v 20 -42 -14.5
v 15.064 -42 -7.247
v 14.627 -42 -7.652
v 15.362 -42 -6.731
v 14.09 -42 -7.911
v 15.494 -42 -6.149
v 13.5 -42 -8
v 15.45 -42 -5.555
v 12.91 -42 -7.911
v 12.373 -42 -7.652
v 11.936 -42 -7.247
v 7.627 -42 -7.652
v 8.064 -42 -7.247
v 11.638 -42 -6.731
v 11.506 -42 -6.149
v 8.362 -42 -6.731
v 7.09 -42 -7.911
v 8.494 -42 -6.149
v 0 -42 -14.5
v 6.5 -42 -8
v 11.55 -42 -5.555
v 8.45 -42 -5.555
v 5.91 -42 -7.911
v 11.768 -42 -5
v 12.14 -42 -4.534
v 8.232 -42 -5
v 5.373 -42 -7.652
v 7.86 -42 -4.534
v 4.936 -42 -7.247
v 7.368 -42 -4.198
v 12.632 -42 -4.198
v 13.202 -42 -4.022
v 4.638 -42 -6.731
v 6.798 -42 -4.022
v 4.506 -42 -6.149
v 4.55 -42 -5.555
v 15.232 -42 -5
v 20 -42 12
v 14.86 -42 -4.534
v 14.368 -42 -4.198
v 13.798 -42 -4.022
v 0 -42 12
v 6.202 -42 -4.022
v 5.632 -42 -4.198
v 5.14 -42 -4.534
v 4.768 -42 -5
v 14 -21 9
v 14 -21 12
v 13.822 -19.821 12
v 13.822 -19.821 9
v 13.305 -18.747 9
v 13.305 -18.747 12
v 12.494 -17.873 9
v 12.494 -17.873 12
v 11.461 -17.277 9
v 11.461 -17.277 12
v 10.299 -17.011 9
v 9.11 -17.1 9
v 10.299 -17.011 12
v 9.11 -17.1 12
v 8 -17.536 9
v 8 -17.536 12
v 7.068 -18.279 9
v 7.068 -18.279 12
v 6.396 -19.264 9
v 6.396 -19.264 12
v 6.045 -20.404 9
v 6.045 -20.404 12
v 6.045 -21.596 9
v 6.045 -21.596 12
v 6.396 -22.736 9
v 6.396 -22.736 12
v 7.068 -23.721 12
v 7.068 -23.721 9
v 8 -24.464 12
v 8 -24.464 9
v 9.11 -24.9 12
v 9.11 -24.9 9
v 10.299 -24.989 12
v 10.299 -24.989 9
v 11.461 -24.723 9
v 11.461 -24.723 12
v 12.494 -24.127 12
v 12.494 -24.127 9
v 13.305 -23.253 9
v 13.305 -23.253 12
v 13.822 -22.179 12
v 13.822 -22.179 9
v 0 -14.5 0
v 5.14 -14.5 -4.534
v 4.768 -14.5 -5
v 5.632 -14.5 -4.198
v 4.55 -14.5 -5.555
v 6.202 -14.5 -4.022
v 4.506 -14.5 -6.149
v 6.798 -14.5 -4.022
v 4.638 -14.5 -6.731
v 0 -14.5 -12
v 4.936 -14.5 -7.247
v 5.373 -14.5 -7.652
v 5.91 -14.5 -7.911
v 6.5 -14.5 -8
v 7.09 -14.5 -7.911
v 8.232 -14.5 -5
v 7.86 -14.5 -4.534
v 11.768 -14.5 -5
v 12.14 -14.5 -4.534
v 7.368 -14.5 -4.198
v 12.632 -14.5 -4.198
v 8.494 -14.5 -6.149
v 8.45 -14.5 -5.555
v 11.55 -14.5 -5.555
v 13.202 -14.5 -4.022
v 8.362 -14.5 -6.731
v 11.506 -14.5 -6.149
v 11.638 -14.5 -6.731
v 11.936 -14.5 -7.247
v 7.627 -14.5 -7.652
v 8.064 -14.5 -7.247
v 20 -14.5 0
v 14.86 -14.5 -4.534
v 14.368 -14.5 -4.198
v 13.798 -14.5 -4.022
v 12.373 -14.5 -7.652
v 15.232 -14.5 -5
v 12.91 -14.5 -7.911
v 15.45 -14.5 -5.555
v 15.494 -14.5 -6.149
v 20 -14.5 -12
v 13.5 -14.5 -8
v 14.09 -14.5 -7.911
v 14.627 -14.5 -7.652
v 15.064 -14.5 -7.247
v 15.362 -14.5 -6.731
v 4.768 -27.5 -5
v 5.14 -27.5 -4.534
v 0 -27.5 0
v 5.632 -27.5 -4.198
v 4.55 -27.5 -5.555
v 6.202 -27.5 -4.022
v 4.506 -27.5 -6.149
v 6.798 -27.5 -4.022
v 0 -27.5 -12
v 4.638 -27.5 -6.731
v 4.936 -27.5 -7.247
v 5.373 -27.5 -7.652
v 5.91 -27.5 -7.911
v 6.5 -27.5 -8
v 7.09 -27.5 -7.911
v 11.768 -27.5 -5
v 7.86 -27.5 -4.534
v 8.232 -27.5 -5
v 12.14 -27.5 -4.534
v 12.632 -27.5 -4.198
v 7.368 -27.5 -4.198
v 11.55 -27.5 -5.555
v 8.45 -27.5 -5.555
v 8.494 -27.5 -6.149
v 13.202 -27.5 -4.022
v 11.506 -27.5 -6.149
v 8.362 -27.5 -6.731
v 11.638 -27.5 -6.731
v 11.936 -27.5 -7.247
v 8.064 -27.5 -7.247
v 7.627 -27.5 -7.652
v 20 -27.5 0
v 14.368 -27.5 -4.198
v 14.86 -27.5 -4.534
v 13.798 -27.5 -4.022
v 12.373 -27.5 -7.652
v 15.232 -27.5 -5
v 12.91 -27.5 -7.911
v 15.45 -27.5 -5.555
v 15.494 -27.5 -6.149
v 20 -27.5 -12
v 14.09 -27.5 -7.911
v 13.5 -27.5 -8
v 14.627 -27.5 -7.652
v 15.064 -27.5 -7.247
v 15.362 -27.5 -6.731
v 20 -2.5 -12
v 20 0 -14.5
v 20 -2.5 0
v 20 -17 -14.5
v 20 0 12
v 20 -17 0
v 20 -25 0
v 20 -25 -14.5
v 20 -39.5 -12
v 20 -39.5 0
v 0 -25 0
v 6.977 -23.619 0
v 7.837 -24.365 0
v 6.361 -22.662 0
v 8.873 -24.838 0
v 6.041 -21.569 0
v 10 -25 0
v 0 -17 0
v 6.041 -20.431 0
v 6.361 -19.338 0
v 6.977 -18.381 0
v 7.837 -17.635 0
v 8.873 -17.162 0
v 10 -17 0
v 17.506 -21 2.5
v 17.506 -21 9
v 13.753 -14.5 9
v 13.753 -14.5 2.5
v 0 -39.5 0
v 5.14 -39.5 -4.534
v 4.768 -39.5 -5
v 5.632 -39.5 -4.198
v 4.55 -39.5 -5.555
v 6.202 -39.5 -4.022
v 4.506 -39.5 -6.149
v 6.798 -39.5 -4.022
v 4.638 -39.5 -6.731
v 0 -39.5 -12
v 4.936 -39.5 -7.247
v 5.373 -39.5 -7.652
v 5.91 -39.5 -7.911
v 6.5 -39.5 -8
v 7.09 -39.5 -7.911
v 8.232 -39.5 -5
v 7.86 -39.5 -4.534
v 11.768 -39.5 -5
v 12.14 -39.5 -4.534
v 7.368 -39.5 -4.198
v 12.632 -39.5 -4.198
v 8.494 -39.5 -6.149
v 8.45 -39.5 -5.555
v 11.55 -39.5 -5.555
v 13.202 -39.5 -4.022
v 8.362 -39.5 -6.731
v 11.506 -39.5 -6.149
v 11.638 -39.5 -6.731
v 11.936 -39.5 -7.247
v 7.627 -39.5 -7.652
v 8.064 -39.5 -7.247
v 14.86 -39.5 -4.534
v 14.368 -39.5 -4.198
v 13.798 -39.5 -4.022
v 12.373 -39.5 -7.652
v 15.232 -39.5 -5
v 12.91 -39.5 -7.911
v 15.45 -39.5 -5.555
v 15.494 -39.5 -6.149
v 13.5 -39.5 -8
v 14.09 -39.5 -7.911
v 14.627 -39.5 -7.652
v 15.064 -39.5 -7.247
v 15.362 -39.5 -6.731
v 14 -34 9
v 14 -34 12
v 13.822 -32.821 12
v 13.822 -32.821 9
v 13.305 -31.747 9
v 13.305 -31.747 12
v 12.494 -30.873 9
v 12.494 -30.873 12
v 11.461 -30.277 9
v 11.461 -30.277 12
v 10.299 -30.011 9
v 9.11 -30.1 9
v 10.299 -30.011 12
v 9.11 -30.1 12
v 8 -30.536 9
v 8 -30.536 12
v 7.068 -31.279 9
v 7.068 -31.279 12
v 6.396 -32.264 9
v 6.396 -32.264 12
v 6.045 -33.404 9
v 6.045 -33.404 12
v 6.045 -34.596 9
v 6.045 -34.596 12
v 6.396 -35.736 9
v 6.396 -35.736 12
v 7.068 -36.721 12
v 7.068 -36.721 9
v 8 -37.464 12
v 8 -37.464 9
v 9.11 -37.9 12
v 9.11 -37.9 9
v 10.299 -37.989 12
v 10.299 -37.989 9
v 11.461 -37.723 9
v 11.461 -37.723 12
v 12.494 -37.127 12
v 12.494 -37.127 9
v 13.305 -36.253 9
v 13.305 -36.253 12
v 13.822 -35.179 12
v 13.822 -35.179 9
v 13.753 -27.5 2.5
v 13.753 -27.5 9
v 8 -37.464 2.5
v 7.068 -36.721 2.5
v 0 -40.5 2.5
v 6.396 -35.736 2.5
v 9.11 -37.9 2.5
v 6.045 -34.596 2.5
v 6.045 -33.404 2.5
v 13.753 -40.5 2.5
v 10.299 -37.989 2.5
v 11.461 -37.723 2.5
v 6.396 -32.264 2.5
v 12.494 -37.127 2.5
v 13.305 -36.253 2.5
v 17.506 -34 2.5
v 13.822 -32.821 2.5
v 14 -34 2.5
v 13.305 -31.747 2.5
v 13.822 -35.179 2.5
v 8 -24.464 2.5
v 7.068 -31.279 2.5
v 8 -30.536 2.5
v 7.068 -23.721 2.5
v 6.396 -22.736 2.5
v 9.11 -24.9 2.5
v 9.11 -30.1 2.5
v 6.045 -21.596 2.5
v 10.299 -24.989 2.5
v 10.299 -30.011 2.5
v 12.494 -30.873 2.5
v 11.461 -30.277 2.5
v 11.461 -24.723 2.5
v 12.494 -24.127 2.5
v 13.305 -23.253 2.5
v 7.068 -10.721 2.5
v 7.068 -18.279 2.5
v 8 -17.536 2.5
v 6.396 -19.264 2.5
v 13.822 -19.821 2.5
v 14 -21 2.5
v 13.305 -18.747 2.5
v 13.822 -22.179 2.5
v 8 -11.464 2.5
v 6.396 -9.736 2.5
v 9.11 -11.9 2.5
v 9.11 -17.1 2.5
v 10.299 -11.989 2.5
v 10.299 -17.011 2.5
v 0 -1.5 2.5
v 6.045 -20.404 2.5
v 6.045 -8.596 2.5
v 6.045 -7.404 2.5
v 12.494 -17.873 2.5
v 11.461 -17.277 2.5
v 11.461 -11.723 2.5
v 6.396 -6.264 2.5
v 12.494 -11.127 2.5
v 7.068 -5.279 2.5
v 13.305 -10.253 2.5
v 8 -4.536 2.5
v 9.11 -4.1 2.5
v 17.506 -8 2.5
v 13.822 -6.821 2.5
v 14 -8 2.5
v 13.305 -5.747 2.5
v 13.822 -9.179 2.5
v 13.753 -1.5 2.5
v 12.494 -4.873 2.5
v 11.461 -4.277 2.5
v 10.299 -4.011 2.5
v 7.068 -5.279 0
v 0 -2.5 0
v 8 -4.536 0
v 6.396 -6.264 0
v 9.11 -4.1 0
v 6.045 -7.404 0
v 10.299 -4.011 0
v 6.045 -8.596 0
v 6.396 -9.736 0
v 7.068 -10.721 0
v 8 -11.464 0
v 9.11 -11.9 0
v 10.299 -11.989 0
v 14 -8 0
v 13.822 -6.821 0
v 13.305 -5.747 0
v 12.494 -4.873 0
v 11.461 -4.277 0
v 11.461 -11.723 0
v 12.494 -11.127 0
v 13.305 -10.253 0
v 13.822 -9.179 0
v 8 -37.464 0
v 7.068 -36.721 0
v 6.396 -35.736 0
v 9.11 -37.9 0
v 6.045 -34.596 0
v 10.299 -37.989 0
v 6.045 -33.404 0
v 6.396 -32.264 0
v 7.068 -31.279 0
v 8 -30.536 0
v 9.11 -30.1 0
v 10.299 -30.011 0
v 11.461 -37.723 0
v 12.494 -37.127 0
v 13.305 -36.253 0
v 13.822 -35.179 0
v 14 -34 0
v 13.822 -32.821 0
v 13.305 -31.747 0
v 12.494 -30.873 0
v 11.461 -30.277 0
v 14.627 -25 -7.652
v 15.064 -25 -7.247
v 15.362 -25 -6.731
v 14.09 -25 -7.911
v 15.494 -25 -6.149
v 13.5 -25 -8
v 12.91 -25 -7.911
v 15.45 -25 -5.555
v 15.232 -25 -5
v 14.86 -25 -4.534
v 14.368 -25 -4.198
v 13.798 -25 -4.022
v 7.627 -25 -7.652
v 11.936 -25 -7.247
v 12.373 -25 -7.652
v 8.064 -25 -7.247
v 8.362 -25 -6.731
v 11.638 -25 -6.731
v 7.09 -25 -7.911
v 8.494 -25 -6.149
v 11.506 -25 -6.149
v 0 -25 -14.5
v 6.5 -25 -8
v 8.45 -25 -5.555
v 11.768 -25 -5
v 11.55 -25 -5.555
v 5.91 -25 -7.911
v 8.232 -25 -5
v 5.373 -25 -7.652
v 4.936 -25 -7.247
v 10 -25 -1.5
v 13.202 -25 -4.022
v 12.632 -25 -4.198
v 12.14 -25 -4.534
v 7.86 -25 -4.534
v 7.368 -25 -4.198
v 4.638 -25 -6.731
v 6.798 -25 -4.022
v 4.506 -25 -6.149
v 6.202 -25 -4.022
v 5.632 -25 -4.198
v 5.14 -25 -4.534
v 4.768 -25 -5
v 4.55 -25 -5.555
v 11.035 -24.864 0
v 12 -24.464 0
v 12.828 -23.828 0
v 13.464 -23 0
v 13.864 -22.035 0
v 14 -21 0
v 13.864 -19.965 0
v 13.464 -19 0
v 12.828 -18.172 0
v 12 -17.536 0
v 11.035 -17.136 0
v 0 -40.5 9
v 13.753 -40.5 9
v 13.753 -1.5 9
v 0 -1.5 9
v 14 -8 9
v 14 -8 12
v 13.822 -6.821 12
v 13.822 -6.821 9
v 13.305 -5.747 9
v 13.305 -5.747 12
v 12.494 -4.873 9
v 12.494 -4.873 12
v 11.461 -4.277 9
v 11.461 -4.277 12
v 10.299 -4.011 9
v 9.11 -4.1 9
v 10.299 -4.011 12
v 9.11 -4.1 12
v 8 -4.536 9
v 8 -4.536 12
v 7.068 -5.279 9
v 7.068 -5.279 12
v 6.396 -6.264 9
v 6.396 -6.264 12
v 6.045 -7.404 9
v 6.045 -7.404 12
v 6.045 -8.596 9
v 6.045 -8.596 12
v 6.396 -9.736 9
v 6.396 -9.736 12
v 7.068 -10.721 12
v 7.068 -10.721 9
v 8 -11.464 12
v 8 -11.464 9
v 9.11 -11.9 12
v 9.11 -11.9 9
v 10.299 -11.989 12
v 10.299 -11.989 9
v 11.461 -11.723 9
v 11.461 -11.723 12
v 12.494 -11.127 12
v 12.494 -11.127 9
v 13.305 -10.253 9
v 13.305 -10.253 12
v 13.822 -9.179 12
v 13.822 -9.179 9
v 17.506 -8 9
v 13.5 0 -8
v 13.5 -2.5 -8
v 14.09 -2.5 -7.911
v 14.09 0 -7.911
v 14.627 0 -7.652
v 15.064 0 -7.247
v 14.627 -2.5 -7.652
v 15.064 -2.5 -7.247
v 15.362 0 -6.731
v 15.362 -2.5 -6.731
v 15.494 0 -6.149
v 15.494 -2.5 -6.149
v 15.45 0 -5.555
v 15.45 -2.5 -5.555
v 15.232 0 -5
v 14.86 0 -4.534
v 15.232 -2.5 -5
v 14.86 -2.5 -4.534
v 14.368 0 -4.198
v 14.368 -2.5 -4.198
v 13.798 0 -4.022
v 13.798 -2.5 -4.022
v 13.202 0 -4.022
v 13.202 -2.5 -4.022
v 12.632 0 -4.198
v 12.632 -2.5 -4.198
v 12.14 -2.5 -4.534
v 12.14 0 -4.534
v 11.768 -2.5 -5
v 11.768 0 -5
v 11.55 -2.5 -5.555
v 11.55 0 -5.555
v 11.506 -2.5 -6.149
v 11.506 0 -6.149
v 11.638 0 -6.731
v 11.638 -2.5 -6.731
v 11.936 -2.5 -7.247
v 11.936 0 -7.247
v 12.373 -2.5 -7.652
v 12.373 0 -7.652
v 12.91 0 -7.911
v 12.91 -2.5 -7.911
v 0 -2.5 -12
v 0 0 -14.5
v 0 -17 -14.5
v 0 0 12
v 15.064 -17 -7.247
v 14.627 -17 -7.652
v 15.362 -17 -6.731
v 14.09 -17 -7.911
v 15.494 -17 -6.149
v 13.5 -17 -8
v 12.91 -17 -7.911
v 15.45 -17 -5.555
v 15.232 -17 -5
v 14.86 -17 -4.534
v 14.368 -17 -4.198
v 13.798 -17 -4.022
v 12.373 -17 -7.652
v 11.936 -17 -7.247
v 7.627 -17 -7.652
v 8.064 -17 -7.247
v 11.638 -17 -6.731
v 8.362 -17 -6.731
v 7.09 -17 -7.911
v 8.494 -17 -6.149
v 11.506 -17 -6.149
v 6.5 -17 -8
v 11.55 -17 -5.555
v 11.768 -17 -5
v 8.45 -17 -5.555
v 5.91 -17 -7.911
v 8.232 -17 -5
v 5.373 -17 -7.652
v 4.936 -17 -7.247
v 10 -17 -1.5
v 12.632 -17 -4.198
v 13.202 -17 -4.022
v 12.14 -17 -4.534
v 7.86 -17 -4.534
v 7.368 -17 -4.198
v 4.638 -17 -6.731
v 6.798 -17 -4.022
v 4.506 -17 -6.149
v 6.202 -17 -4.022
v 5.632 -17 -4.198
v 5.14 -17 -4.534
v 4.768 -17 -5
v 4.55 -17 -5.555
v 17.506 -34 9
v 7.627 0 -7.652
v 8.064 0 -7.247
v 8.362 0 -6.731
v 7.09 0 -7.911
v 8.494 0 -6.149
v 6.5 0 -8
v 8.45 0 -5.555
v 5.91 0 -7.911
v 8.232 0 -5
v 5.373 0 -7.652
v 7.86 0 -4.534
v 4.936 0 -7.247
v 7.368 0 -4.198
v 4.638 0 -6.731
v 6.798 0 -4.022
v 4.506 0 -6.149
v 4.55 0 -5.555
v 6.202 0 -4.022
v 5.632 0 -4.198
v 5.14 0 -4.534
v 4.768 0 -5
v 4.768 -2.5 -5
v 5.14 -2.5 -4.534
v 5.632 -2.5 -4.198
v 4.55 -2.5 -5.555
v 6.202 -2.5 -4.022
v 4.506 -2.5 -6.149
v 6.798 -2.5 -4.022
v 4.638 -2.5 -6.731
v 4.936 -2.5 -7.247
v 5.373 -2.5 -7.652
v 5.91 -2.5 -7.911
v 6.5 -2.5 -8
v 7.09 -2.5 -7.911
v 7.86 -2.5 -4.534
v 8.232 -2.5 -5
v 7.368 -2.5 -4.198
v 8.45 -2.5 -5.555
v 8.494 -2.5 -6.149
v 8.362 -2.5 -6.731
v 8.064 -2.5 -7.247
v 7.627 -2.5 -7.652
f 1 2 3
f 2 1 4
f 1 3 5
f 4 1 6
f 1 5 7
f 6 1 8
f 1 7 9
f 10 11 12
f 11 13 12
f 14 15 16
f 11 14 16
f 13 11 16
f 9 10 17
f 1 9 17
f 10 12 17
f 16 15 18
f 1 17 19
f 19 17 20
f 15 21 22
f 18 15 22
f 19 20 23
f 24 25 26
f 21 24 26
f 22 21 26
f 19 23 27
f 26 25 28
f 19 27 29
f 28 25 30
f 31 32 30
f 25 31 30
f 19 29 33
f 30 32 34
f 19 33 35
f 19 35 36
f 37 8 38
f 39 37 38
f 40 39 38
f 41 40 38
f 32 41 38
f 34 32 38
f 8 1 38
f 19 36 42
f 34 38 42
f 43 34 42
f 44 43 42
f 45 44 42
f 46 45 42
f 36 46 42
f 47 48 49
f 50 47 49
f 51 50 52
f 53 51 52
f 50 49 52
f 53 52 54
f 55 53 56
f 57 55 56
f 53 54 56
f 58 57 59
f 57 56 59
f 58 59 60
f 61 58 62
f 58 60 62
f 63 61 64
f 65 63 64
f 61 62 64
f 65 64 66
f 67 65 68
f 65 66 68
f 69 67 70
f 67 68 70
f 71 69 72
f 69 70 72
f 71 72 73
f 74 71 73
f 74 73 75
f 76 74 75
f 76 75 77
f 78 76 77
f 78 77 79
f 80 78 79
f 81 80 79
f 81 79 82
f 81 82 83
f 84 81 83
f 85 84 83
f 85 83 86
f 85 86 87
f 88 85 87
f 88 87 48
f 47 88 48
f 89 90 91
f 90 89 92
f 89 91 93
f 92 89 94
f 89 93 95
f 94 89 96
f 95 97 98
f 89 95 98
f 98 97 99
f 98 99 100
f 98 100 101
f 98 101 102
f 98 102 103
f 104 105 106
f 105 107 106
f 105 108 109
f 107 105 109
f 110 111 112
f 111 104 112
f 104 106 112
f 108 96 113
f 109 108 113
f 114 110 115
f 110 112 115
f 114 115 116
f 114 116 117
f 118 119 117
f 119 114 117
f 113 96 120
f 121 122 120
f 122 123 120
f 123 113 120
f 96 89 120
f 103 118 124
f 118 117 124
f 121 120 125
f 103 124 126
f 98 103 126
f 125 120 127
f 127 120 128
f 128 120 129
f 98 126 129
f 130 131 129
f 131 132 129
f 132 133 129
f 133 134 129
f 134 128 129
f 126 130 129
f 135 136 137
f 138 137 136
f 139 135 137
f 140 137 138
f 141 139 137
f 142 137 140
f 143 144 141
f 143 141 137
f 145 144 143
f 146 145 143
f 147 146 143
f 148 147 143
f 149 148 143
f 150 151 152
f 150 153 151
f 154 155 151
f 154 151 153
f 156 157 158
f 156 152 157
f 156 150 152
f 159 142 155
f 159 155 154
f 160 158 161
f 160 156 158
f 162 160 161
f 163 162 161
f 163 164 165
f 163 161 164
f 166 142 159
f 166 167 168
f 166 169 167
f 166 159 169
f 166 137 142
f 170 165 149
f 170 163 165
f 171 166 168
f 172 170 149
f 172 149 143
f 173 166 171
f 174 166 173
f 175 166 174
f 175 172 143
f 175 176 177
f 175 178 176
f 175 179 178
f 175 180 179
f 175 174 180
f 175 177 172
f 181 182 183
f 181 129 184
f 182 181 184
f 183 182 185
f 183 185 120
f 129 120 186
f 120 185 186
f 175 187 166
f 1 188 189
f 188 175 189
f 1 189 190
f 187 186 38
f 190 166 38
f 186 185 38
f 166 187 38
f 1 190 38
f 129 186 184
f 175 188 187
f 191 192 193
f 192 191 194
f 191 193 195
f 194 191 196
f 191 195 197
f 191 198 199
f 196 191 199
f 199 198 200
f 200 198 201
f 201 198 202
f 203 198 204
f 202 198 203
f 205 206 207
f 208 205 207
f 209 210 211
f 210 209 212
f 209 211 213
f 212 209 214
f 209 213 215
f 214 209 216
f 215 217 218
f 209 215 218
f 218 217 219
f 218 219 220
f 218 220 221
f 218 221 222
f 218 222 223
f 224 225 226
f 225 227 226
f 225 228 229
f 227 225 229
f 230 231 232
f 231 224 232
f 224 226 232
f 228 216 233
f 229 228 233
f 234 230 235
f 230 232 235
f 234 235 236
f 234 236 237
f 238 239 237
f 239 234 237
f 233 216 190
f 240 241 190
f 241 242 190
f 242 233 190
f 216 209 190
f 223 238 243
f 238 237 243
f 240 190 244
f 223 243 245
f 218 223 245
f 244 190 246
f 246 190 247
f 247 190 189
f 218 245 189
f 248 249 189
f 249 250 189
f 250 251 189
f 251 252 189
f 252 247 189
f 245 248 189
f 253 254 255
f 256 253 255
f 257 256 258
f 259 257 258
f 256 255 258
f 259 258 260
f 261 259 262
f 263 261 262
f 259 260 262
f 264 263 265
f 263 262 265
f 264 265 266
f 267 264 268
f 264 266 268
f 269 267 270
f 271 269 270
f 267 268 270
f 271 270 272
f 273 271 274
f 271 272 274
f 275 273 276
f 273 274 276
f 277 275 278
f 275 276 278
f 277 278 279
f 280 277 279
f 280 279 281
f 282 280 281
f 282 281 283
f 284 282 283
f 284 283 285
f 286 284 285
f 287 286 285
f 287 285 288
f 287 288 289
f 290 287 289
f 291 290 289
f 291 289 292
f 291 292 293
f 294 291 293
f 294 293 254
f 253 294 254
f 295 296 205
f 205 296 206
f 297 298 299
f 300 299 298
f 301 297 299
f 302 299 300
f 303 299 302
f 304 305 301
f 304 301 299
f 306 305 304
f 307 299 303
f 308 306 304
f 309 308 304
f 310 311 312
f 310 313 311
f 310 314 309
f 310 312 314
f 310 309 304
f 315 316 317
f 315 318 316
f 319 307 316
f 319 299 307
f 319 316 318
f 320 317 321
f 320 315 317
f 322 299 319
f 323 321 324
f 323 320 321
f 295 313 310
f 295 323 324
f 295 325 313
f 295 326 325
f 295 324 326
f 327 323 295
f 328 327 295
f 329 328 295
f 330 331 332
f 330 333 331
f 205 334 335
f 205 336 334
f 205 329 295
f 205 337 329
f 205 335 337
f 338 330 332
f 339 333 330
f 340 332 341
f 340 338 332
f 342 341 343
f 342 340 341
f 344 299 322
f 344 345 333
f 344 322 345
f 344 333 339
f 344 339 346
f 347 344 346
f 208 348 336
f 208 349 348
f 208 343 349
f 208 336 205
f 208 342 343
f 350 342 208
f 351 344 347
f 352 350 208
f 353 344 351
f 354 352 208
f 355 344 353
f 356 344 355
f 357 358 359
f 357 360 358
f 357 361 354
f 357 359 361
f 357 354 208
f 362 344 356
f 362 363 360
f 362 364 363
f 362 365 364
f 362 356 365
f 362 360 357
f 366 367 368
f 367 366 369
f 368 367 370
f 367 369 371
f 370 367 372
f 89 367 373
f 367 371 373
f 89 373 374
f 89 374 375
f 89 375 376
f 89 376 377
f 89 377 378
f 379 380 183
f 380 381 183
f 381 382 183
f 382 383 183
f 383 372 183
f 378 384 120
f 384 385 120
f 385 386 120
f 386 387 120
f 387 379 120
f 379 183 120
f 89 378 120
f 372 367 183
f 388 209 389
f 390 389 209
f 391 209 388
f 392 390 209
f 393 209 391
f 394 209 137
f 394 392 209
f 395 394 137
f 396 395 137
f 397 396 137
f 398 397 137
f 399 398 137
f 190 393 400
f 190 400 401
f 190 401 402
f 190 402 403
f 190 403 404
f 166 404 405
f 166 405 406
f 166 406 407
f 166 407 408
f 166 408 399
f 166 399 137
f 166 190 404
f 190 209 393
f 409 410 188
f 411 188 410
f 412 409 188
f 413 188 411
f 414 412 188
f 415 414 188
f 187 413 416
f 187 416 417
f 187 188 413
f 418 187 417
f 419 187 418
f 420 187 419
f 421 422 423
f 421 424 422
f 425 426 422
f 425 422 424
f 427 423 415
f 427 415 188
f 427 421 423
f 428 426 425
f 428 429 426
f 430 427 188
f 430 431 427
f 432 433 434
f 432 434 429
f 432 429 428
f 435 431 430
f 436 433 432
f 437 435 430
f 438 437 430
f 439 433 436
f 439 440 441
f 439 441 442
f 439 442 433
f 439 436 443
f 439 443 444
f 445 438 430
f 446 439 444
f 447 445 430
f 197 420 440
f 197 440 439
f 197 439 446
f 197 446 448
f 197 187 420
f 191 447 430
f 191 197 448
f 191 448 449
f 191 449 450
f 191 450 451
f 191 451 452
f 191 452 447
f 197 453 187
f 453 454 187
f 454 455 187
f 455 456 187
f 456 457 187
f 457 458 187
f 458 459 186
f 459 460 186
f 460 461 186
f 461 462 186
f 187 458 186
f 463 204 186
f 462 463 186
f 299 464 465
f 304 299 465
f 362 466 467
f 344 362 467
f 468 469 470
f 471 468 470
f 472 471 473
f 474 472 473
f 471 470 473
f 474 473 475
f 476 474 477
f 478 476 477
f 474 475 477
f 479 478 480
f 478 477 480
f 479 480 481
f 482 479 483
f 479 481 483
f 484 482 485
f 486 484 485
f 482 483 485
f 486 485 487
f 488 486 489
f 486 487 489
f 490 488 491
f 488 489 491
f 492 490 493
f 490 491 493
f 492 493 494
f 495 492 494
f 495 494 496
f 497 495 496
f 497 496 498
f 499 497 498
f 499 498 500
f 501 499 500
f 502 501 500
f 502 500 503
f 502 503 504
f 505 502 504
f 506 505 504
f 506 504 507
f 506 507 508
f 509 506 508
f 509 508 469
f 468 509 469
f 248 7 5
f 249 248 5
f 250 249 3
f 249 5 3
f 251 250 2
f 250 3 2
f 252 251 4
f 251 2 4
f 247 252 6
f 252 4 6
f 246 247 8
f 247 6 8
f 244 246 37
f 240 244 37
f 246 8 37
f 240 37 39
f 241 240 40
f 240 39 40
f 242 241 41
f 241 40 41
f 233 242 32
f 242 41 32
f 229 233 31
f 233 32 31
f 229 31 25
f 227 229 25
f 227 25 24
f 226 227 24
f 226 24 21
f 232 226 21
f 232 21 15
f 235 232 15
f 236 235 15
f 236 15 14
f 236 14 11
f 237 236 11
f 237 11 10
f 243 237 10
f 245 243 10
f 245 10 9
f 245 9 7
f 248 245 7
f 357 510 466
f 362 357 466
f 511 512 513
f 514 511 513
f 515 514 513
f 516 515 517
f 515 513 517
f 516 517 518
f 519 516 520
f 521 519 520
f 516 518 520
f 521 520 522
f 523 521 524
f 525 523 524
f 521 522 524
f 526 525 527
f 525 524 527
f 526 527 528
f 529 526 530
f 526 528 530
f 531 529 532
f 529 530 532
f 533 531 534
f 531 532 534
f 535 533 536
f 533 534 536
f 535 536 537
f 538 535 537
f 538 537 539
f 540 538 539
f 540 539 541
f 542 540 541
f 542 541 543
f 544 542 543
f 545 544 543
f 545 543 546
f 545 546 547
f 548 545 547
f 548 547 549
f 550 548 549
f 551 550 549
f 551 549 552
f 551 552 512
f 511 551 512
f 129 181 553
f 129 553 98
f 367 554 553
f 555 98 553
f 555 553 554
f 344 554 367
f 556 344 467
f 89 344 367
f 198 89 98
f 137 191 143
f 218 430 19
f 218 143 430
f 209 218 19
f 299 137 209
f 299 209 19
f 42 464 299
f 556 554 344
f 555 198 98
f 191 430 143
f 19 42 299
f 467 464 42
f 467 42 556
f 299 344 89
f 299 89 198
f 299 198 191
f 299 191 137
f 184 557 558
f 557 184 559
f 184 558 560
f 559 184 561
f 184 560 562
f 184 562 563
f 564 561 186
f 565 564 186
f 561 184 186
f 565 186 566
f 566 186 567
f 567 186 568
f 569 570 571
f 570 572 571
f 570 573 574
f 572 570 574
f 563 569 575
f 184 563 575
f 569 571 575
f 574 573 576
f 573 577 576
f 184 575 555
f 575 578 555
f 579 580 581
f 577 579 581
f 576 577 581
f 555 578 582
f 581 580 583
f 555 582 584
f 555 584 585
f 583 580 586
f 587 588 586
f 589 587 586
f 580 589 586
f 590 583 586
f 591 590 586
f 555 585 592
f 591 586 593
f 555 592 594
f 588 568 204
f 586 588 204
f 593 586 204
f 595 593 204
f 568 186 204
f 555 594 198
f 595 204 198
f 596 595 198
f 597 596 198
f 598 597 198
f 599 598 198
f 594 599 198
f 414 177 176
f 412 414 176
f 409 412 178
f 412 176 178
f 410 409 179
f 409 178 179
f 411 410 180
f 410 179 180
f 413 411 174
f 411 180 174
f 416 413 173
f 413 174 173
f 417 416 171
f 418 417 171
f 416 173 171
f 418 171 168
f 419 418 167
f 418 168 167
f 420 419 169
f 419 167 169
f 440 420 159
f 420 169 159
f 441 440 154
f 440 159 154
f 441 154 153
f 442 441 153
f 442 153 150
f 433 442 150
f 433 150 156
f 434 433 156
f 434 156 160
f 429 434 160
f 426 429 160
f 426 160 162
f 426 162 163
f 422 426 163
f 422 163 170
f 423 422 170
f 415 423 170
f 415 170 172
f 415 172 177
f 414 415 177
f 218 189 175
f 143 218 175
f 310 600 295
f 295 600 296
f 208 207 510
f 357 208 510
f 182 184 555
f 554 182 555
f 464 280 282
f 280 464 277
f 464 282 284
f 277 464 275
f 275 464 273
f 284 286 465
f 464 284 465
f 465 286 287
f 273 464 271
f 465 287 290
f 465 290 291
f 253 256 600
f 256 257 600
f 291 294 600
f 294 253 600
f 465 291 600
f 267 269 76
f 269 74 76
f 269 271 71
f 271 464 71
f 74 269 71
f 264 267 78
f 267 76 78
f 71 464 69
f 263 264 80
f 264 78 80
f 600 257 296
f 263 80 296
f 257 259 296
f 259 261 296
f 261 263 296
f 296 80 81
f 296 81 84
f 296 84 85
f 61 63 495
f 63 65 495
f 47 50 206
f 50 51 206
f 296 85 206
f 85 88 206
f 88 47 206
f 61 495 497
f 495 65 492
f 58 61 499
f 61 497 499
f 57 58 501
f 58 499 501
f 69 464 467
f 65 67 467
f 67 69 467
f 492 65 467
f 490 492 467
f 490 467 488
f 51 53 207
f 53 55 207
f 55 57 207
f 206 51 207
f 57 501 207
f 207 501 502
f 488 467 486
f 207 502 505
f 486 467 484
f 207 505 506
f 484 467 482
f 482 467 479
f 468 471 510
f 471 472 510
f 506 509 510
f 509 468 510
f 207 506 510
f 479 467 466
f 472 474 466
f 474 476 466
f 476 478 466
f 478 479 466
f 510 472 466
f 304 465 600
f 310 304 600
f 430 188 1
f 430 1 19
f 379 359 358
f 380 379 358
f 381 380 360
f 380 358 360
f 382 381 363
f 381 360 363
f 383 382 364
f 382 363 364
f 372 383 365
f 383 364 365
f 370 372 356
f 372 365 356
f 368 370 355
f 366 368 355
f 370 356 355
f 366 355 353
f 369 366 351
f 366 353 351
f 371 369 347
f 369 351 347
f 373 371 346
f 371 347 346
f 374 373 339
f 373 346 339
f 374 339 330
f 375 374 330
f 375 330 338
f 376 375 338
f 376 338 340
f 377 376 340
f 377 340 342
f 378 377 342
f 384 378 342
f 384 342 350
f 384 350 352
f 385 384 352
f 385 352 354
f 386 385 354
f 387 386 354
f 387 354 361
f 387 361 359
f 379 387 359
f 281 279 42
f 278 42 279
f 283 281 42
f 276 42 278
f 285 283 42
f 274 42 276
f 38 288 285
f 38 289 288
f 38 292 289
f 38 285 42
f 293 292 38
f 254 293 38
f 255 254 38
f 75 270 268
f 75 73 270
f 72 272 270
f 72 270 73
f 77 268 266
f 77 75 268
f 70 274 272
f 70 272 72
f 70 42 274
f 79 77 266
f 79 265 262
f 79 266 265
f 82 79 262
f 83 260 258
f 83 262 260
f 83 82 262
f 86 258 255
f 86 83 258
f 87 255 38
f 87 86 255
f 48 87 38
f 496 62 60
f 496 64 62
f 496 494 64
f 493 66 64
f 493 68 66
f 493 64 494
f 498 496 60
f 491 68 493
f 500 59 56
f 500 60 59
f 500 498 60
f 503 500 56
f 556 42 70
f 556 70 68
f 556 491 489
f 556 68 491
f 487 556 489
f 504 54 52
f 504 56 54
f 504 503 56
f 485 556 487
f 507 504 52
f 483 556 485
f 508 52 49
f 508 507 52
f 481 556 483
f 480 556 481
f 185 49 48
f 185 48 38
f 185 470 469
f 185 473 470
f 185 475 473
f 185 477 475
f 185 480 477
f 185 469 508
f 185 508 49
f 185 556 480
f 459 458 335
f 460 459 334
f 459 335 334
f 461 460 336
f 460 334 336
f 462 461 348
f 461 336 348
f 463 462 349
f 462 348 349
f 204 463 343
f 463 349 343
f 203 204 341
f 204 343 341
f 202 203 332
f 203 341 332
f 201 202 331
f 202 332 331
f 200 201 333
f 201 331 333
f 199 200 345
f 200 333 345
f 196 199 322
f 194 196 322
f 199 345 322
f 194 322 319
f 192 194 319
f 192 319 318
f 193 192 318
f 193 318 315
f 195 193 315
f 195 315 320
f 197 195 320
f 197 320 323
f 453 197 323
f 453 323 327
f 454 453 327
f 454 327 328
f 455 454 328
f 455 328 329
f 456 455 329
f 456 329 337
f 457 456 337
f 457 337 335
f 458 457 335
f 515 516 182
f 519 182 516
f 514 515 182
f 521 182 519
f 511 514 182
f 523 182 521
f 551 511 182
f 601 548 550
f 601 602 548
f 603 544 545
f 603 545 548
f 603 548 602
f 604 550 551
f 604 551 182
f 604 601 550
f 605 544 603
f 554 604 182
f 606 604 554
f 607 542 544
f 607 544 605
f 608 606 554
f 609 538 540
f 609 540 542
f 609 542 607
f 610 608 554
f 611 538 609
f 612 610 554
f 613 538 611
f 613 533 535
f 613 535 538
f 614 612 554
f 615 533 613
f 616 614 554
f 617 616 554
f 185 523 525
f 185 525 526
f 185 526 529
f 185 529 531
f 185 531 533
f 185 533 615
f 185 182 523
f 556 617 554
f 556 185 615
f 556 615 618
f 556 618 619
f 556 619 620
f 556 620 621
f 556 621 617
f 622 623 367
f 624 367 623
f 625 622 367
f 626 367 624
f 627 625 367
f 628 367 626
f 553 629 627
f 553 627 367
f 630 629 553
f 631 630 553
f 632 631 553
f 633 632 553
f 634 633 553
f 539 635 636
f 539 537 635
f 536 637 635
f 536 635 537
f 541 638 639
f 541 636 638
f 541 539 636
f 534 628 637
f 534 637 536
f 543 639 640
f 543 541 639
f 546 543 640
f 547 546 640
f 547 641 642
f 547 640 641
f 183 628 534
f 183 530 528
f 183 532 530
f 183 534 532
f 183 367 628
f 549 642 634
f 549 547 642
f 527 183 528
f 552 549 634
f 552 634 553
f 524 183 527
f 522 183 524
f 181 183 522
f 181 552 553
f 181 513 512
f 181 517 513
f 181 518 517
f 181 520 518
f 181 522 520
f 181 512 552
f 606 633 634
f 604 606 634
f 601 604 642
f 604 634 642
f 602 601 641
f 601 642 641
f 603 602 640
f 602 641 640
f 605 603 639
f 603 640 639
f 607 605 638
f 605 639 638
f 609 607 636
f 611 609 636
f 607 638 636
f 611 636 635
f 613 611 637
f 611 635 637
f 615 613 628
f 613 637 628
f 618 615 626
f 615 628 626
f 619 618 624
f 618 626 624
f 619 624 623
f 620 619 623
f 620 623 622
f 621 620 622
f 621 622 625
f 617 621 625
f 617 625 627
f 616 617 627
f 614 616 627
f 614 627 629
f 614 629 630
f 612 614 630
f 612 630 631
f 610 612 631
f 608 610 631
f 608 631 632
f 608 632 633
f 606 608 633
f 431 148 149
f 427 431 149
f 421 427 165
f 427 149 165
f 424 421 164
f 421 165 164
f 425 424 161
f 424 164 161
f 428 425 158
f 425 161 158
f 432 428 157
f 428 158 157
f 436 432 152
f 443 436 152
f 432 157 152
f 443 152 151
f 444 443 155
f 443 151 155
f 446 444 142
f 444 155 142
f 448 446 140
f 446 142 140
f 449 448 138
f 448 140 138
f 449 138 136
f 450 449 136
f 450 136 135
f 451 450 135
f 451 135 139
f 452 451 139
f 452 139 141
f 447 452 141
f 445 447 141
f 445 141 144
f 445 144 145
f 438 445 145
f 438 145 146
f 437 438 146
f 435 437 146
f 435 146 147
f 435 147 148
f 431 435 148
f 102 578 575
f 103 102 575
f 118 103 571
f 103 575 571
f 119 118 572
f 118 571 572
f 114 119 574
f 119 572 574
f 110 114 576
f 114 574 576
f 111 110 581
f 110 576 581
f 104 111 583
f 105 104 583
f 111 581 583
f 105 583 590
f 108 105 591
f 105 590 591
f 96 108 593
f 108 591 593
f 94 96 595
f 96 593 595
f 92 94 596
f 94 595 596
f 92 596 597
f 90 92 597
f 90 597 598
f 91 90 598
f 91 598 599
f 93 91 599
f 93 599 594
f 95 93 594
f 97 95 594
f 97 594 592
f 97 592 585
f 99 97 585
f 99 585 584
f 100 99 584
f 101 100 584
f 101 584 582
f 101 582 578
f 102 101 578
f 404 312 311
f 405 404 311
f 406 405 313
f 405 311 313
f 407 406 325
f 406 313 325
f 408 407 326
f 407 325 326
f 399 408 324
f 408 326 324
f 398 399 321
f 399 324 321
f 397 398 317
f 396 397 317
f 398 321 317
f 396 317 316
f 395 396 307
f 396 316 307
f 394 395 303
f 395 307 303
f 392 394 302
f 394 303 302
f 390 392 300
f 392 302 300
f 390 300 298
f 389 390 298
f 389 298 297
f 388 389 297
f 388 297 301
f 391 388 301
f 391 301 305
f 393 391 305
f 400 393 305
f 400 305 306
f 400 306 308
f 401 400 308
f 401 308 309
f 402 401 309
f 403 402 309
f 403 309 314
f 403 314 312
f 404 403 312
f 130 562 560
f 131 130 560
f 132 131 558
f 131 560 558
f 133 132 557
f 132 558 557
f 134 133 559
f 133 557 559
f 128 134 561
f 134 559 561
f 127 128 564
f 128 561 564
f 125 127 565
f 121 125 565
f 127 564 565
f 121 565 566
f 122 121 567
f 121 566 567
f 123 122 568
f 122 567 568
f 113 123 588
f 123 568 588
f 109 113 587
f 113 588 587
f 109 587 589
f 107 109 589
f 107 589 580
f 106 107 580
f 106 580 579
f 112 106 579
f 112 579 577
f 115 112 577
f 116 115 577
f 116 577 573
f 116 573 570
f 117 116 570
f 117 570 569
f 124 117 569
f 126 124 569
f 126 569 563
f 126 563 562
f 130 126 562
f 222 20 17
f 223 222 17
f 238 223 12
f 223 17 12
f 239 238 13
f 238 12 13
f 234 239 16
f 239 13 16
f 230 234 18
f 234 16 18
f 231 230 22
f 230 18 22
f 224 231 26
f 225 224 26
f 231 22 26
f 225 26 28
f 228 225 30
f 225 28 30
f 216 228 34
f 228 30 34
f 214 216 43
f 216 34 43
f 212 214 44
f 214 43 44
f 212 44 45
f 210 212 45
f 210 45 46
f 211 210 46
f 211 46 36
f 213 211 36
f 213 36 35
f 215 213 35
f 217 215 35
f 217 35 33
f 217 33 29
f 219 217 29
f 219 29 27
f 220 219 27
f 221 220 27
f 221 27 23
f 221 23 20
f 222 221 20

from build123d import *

# Parameters (mm, degrees)
ESQUISSE1_W             = 20
ESQUISSE1_H             = 42
BOSS_EXTRU_1_DEPTH      = 12
ESQUISSE2_W             = 20
ESQUISSE2_H             = 17
BOSS_EXTRU_3_DEPTH      = 14.5
ESQUISSE3_W             = 12
ESQUISSE3_H             = 12
ENL_V_MAT_EXTRU_3_DEPTH = 49.726276279
ESQUISSE4_R             = 2
ENL_V_MAT_EXTRU_4_DEPTH = 42
ENL_V_START             = -3
ENL_V_MAT_EXTRU_5_DEPTH = 6.5
ESQUISSE6_R             = 4
ENL_V_MAT_EXTRU_6_DEPTH = 13.5


with BuildPart() as part:
    # Esquisse1 → Boss.-Extru.1 (new body)
    with BuildSketch(Plane.XY):
        with Locations((10, -21)):
            Rectangle(ESQUISSE1_W, ESQUISSE1_H)
    extrude(amount=BOSS_EXTRU_1_DEPTH)

    # Esquisse2 → Boss.-Extru.3 (add)
    with BuildSketch(Plane(origin=(0, 0, 0), x_dir=(-1, 0, 0), z_dir=(0, 0, -1))):
        with Locations((-10, -33.5)):
            Rectangle(ESQUISSE2_W, ESQUISSE2_H)
    boss_extru_3 = extrude(amount=BOSS_EXTRU_3_DEPTH)

    # Esquisse3 → Enlèv. mat.-Extru.3 (cut, through all)
    with BuildSketch(Plane(origin=(20, 0, 0), x_dir=(0, 0, -1), z_dir=(1, 0, 0))):
        with Locations((6, -33.5)):
            Rectangle(ESQUISSE3_W, ESQUISSE3_H)
    enl_v_mat_extru_3 = extrude(amount=-ENL_V_MAT_EXTRU_3_DEPTH, mode=Mode.SUBTRACT)

    # Symétrie1: Boss.-Extru.3, Enlèv. mat.-Extru.3 across plane
    add(boss_extru_3.mirror(Plane(origin=(0, -21, 0), x_dir=(0, 0, 1), z_dir=(0, -1, 0))))
    add(enl_v_mat_extru_3.mirror(Plane(origin=(0, -21, 0), x_dir=(0, 0, 1), z_dir=(0, -1, 0))), mode=Mode.SUBTRACT)

    # Esquisse4 → Enlèv. mat.-Extru.4 (cut)
    with BuildSketch(Plane.XZ.offset(42)):
        with Locations(Location((13.5, -6, 0), (0, 0, 270))):
            Circle(ESQUISSE4_R)
        with Locations(Location((6.5, -6, 0), (0, 0, 270))):
            Circle(ESQUISSE4_R)
    extrude(amount=-ENL_V_MAT_EXTRU_4_DEPTH, mode=Mode.SUBTRACT)

    # Esquisse5 → Enlèv. mat.-Extru.5 (cut)
    with BuildSketch(Plane.XY.offset(12).offset(ENL_V_START)):
        Polygon((13.75277675, -27.5), (17.505553499, -21), (13.75277675, -14.5), (6.24722325, -14.5), (2.494446501, -21), (6.24722325, -27.5), align=None)
        Polygon((6.24722325, -27.5), (2.494446501, -34), (6.24722325, -40.5), (13.75277675, -40.5), (17.505553499, -34), (13.75277675, -27.5), align=None)
        Polygon((0, -40.5), (6.24722325, -40.5), (2.494446501, -34), (6.24722325, -27.5), (2.494446501, -21), (6.24722325, -14.5), (2.494446501, -8), (6.24722325, -1.5), (0, -1.5), align=None)
        Polygon((2.494446501, -8), (6.24722325, -14.5), (13.75277675, -14.5), (17.505553499, -8), (13.75277675, -1.5), (6.24722325, -1.5), align=None)
    extrude(amount=-ENL_V_MAT_EXTRU_5_DEPTH, mode=Mode.SUBTRACT)

    # Esquisse6 → Enlèv. mat.-Extru.6 (cut)
    with BuildSketch(Plane.XY.offset(12)):
        with Locations((10, -34)):
            Circle(ESQUISSE6_R)
        with Locations((10, -21)):
            Circle(ESQUISSE6_R)
        with Locations((10, -8)):
            Circle(ESQUISSE6_R)
    extrude(amount=-ENL_V_MAT_EXTRU_6_DEPTH, mode=Mode.SUBTRACT)


solid = part.part
